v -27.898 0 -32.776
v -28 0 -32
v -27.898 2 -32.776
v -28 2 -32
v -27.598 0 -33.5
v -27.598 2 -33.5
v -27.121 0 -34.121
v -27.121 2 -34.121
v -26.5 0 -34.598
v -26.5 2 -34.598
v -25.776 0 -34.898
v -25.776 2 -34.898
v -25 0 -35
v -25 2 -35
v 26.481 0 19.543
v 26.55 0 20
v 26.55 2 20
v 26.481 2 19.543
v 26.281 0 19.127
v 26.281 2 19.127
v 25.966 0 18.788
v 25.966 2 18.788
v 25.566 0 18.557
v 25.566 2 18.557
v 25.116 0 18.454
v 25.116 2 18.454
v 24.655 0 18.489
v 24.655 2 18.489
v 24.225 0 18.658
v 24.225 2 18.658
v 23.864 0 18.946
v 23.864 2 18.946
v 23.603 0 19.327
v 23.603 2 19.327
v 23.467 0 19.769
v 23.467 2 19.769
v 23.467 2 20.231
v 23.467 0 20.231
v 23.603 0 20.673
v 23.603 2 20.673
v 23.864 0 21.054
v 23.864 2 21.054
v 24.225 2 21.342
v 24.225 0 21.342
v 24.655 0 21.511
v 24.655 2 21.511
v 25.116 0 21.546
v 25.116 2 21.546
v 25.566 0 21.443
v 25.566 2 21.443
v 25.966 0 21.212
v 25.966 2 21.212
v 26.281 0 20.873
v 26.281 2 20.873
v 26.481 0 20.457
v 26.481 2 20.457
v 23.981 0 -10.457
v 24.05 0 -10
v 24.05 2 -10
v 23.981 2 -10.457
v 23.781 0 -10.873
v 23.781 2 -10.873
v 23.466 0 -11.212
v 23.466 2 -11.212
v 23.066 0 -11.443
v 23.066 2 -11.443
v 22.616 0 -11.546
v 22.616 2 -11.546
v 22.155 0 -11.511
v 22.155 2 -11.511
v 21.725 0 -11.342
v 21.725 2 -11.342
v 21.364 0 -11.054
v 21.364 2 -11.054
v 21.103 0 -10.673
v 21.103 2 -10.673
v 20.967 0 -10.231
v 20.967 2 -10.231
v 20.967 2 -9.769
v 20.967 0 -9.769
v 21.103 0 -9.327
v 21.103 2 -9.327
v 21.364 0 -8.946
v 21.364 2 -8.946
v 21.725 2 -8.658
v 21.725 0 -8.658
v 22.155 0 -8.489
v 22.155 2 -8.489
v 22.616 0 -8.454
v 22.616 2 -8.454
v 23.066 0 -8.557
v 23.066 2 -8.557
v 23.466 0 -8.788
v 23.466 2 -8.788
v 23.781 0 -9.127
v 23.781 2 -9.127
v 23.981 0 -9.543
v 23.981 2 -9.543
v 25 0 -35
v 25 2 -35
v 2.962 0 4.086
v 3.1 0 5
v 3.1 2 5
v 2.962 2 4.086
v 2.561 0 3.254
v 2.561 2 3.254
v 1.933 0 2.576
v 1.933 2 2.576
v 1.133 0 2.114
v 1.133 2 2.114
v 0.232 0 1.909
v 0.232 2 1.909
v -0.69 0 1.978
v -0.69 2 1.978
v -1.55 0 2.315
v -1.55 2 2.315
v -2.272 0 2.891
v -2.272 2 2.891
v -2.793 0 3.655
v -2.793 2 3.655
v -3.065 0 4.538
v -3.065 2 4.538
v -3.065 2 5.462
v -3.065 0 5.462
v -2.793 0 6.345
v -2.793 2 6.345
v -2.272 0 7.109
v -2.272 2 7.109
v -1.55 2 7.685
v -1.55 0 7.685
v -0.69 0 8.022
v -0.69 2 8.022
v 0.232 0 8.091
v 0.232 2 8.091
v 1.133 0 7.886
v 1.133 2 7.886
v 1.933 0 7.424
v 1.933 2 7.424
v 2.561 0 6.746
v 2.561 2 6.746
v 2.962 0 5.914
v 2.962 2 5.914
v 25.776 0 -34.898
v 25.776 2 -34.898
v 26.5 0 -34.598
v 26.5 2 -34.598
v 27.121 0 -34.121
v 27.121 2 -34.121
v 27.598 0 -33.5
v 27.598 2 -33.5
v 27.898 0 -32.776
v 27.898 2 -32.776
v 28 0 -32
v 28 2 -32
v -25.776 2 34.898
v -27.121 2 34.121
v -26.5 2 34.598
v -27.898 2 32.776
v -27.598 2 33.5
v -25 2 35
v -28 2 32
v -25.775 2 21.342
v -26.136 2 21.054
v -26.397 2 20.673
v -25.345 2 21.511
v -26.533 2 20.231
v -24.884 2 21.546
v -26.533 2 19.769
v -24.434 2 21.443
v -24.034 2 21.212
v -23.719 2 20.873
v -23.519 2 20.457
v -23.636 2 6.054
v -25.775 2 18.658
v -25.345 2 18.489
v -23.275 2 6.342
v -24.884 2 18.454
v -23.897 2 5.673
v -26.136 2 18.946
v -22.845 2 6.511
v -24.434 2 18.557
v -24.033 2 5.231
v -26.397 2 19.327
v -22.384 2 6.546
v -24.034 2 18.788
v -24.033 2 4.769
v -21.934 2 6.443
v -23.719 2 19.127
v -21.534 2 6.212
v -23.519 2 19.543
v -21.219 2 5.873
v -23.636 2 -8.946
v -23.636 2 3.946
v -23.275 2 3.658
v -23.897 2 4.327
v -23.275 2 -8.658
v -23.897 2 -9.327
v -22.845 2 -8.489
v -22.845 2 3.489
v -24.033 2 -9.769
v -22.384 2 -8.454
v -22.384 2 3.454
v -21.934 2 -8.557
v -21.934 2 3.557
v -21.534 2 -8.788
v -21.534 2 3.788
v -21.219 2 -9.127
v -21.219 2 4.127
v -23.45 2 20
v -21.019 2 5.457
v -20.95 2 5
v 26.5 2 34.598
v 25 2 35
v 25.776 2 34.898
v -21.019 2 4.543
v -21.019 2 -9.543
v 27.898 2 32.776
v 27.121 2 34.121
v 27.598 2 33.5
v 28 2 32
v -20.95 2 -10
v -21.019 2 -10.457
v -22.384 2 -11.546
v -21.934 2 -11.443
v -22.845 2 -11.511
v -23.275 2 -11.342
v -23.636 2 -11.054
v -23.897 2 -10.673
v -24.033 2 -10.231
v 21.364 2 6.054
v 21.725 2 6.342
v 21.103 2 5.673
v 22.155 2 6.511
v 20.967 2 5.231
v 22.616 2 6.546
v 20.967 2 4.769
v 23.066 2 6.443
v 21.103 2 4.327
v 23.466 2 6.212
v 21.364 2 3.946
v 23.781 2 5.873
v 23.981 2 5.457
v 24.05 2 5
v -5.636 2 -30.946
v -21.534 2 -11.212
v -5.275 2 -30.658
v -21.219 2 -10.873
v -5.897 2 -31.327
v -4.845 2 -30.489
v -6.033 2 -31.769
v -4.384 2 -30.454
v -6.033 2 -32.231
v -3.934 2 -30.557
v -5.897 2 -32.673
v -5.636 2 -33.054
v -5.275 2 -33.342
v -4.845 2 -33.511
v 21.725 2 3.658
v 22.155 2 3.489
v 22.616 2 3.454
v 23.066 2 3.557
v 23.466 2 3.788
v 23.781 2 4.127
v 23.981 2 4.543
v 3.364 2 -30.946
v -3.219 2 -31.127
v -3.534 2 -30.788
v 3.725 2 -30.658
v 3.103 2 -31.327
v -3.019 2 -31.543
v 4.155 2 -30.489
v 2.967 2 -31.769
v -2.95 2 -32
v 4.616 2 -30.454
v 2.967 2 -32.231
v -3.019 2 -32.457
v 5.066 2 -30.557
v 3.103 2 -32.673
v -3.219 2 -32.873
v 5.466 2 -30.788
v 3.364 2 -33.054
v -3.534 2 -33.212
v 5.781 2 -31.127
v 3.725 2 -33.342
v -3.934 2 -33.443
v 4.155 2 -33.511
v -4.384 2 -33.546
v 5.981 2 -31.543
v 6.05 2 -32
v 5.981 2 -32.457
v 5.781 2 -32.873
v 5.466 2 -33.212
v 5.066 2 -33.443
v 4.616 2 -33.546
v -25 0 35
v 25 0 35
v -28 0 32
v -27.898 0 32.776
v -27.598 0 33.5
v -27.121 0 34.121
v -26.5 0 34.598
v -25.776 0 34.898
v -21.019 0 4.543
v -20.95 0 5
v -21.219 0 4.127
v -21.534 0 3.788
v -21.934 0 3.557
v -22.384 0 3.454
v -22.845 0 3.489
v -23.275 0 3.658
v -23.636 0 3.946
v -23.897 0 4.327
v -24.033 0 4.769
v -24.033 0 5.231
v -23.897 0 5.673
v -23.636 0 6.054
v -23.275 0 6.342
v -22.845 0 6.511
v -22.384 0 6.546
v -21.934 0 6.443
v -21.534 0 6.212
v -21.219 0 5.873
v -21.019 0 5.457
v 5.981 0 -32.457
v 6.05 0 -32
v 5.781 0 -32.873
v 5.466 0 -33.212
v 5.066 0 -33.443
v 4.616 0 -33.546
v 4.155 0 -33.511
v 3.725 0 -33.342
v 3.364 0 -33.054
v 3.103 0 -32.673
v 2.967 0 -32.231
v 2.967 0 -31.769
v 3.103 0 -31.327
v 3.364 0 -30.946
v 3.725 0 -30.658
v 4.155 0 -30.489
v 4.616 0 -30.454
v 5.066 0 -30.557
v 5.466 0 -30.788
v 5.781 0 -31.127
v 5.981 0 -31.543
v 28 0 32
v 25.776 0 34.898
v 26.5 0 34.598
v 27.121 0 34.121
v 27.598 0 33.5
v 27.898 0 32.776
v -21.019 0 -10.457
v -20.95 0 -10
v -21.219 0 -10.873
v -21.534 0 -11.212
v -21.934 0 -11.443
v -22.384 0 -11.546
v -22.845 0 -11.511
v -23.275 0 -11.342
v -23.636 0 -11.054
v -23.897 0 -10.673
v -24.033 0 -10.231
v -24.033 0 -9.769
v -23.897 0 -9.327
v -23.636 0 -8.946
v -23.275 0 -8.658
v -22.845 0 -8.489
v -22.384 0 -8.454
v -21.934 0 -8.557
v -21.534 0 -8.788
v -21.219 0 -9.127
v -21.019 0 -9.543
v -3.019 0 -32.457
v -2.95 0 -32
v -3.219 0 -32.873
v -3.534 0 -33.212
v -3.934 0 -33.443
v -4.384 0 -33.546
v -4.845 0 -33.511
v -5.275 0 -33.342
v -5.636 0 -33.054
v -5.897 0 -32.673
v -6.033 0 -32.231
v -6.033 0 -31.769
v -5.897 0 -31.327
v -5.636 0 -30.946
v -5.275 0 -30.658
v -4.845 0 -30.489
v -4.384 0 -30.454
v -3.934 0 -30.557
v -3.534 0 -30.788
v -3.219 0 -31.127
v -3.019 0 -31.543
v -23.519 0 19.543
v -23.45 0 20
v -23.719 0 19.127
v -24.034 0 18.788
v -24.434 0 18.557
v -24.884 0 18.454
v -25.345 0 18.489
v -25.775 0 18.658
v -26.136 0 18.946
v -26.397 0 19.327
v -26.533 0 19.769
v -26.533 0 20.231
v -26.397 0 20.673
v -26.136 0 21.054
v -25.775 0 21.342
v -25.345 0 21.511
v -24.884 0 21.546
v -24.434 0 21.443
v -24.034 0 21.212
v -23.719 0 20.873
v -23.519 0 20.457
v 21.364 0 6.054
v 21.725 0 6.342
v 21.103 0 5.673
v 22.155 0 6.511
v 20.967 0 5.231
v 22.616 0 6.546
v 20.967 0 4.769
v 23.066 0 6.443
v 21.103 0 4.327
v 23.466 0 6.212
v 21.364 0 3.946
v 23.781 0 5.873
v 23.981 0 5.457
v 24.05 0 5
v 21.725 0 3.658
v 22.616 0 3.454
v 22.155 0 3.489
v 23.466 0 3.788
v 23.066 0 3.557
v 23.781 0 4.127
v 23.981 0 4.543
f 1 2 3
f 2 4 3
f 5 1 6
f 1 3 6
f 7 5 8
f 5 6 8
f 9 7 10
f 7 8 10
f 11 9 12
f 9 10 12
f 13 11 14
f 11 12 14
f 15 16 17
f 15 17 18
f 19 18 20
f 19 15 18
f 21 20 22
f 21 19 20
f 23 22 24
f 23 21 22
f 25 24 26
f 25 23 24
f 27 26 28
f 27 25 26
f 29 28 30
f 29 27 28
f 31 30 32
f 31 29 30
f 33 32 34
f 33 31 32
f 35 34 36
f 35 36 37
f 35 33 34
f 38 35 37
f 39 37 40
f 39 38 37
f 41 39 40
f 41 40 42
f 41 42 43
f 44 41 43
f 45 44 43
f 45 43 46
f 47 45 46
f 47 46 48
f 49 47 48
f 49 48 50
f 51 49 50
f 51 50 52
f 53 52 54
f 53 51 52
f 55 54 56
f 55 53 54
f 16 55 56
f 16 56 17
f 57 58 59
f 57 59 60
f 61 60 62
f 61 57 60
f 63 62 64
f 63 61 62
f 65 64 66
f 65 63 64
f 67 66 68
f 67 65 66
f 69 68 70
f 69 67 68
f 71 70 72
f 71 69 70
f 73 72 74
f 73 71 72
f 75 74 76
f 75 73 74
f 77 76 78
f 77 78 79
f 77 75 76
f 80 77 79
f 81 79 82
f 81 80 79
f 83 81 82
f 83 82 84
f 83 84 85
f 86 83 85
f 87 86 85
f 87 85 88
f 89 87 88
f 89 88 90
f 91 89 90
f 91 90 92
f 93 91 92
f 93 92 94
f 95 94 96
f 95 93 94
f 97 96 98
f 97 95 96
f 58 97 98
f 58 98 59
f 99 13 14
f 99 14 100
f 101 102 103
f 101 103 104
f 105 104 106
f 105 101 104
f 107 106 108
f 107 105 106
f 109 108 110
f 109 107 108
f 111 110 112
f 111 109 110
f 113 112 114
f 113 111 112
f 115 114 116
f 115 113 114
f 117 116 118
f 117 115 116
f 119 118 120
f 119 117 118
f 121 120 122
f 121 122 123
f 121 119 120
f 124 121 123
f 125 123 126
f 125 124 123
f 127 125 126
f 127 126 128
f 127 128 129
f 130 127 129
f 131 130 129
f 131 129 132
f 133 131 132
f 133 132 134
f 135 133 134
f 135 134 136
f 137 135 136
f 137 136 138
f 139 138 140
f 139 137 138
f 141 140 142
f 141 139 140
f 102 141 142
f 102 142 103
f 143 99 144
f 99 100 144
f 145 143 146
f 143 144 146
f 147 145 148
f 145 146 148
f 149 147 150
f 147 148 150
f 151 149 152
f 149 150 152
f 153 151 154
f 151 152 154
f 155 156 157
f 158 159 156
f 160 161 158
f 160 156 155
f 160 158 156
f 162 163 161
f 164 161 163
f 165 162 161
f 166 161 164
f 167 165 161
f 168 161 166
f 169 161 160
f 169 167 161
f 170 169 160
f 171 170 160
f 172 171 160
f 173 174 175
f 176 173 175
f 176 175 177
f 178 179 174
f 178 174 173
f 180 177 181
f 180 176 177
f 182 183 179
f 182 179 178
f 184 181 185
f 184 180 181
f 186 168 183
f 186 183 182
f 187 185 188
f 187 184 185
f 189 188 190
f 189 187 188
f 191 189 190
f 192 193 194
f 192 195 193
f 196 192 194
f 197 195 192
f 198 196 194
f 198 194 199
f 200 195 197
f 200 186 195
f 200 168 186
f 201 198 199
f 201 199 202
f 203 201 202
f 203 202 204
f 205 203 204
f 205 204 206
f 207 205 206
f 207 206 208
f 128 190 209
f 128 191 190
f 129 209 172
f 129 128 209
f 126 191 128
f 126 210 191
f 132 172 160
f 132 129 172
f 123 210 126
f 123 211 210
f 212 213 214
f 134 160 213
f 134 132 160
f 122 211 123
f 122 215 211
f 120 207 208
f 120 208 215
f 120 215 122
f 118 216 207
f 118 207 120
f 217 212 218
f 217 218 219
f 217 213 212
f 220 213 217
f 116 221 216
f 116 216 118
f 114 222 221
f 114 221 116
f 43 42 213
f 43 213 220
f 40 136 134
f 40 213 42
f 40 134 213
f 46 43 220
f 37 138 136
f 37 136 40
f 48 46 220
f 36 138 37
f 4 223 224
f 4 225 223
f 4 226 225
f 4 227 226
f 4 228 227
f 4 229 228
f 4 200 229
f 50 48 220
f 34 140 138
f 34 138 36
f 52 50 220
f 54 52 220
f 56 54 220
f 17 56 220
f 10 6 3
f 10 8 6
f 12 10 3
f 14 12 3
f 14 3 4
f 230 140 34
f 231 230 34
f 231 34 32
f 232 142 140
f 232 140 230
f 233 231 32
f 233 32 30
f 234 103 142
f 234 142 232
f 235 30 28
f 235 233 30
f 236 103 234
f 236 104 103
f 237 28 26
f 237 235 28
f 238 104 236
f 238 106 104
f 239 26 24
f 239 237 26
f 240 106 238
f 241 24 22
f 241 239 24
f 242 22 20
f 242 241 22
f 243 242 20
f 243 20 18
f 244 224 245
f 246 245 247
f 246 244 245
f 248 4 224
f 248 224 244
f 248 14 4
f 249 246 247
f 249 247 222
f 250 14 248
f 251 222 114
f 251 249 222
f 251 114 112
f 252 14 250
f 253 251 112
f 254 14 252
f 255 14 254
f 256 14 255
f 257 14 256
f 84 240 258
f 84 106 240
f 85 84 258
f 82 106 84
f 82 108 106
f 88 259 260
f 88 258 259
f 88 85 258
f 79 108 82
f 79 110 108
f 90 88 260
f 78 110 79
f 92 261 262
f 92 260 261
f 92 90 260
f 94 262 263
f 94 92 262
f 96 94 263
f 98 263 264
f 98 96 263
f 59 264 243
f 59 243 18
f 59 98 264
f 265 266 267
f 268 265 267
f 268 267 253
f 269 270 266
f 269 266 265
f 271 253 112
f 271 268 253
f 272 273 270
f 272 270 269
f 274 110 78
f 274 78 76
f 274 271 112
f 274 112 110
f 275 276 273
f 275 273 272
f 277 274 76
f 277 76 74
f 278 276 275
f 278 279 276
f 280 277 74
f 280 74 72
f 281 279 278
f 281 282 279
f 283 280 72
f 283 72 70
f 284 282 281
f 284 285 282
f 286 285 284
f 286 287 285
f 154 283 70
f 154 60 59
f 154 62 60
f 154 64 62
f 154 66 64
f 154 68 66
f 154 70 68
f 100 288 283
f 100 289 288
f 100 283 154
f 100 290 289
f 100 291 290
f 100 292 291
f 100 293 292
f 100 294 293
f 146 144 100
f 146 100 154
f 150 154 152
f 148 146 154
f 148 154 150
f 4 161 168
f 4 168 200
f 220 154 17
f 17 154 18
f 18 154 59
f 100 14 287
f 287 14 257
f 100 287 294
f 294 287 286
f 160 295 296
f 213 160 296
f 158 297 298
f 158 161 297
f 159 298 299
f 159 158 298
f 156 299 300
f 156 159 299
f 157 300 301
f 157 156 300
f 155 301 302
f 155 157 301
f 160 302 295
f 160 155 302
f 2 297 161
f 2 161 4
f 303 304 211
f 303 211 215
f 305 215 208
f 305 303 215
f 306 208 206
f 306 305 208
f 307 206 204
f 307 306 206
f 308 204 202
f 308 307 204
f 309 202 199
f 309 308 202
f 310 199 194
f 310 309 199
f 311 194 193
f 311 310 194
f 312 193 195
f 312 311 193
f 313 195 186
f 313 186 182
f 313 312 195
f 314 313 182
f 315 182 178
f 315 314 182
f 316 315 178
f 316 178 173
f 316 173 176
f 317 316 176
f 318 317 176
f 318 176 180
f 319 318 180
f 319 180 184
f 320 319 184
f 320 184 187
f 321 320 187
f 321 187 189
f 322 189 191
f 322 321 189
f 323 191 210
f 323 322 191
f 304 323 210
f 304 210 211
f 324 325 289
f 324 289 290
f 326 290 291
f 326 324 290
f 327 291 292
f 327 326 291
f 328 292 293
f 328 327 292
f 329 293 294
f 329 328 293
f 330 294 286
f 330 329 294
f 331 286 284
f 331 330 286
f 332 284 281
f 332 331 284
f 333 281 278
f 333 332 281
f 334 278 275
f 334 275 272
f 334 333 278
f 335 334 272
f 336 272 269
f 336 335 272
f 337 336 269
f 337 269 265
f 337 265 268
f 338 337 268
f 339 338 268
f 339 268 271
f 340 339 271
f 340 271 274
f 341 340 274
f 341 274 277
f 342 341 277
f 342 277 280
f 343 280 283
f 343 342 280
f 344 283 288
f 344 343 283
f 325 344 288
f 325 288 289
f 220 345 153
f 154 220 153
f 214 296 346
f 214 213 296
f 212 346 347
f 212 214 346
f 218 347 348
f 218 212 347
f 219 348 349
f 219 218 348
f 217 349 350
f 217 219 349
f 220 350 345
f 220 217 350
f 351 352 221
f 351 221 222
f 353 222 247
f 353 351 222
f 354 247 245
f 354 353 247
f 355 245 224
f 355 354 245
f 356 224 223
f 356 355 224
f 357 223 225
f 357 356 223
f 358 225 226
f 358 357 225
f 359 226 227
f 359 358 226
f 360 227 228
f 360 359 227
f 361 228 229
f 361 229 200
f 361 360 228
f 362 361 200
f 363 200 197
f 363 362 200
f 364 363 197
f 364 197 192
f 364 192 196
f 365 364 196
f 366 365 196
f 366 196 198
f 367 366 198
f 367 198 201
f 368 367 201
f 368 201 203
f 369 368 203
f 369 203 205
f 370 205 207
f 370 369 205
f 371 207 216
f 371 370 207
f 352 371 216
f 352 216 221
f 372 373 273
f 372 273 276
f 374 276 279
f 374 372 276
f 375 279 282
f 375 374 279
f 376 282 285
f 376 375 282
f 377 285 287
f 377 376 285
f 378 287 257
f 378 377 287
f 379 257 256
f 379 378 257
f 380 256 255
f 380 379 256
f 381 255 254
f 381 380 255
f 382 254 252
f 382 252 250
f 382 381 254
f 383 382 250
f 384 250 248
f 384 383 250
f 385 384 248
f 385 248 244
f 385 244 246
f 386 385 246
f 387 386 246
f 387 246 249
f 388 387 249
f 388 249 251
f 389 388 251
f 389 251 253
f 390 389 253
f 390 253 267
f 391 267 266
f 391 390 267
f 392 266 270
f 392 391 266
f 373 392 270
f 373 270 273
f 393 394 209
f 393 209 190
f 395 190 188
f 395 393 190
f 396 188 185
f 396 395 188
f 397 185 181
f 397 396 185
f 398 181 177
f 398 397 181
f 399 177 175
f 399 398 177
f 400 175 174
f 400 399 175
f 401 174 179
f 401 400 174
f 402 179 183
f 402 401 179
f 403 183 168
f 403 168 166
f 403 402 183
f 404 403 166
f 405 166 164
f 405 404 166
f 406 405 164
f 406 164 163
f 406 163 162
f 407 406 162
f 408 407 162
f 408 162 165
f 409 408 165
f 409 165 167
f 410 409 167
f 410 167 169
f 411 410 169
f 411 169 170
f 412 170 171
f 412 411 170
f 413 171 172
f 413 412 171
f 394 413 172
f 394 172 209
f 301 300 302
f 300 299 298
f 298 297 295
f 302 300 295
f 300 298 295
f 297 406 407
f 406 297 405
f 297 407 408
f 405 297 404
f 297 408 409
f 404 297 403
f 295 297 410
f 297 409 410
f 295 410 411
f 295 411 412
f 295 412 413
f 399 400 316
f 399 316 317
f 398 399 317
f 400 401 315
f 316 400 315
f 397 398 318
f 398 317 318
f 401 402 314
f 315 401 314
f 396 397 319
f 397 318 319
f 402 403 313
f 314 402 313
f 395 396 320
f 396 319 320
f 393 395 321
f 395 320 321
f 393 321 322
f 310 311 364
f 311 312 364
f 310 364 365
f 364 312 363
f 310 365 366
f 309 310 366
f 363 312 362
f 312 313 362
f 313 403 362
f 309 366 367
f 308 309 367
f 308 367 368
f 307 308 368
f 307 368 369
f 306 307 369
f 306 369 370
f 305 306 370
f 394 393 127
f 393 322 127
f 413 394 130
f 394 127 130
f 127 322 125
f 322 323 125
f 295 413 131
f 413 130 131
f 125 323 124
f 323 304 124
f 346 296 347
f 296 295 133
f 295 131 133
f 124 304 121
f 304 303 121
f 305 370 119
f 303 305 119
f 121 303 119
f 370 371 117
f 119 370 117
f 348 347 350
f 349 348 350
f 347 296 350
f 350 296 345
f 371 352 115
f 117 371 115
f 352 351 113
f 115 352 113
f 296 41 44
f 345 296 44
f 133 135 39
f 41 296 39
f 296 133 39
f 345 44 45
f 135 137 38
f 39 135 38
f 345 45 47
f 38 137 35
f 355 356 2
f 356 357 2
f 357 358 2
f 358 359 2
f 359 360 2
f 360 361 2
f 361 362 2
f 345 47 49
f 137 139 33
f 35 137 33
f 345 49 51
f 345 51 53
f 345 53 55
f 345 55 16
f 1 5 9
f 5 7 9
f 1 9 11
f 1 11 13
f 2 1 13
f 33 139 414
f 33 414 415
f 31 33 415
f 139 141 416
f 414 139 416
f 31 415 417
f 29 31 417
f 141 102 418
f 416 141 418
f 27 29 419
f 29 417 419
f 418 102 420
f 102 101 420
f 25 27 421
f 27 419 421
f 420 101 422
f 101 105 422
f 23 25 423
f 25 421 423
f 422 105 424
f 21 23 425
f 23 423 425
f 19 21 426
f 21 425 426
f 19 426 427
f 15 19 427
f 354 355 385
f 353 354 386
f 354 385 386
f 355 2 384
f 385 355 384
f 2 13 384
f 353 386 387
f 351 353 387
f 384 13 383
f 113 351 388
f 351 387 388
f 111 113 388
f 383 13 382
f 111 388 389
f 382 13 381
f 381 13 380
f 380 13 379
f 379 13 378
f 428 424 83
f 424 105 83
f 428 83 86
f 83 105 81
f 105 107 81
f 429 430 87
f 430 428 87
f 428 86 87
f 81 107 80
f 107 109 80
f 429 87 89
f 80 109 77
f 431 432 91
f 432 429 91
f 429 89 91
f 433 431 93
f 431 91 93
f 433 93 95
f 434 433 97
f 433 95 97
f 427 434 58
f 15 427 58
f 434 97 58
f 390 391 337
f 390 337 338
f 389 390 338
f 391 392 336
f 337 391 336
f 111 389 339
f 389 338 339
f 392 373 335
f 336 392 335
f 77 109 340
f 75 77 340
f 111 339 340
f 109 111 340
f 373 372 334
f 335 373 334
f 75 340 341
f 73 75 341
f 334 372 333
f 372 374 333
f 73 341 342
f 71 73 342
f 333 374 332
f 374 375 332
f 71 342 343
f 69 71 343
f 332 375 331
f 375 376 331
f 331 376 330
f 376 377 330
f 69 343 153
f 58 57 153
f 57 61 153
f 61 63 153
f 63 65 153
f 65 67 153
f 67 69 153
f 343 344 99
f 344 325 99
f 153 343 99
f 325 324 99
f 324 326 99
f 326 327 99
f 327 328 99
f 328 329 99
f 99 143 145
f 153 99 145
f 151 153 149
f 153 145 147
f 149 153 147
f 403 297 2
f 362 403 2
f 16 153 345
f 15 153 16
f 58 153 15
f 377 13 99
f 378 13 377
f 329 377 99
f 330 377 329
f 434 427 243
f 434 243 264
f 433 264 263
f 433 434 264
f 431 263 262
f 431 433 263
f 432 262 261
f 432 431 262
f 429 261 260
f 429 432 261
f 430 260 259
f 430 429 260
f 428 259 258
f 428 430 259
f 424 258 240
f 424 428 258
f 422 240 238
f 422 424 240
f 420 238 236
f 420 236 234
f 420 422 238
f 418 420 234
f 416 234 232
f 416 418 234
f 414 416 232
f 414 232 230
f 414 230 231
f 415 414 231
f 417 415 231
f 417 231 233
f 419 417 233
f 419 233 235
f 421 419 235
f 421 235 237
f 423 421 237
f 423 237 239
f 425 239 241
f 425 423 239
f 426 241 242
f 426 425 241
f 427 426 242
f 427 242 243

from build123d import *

# Parameters (mm, degrees)
SKETCH1_W           = 56
SKETCH1_H           = 70
SKETCH1_R           = 1.55
SKETCH1_R_2         = 3.1
BOSS_EXTRUDE1_DEPTH = 2
FILLET1_R           = 3


with BuildPart() as part:
    # Sketch1 → Boss-Extrude1 (new body)
    with BuildSketch(Plane(origin=(0, 0, 0), x_dir=(1, 0, 0), z_dir=(0, 1, 0))):
        Rectangle(SKETCH1_W, SKETCH1_H)
        with Locations((-22.5, -5)):
            Circle(SKETCH1_R, mode=Mode.SUBTRACT)
        with Locations((22.5, -5)):
            Circle(SKETCH1_R, mode=Mode.SUBTRACT)
        with Locations((-4.5, 32)):
            Circle(SKETCH1_R, mode=Mode.SUBTRACT)
        with Locations((4.5, 32)):
            Circle(SKETCH1_R, mode=Mode.SUBTRACT)
        with Locations((-22.5, 10)):
            Circle(SKETCH1_R, mode=Mode.SUBTRACT)
        with Locations((22.5, 10)):
            Circle(SKETCH1_R, mode=Mode.SUBTRACT)
        with Locations((-25, -20)):
            Circle(SKETCH1_R, mode=Mode.SUBTRACT)
        with Locations((25, -20)):
            Circle(SKETCH1_R, mode=Mode.SUBTRACT)
        with Locations((0, -5)):
            Circle(SKETCH1_R_2, mode=Mode.SUBTRACT)
    extrude(amount=BOSS_EXTRUDE1_DEPTH)

    # Fillet1
    fillet1_edges = [part.edges().sort_by_distance(p)[0] for p in [
        (28, 1, 35),
        (-28, 1, 35),
        (-28, 1, -35),
        (28, 1, -35),
    ]]
    fillet(fillet1_edges, radius=FILLET1_R)


solid = part.part
